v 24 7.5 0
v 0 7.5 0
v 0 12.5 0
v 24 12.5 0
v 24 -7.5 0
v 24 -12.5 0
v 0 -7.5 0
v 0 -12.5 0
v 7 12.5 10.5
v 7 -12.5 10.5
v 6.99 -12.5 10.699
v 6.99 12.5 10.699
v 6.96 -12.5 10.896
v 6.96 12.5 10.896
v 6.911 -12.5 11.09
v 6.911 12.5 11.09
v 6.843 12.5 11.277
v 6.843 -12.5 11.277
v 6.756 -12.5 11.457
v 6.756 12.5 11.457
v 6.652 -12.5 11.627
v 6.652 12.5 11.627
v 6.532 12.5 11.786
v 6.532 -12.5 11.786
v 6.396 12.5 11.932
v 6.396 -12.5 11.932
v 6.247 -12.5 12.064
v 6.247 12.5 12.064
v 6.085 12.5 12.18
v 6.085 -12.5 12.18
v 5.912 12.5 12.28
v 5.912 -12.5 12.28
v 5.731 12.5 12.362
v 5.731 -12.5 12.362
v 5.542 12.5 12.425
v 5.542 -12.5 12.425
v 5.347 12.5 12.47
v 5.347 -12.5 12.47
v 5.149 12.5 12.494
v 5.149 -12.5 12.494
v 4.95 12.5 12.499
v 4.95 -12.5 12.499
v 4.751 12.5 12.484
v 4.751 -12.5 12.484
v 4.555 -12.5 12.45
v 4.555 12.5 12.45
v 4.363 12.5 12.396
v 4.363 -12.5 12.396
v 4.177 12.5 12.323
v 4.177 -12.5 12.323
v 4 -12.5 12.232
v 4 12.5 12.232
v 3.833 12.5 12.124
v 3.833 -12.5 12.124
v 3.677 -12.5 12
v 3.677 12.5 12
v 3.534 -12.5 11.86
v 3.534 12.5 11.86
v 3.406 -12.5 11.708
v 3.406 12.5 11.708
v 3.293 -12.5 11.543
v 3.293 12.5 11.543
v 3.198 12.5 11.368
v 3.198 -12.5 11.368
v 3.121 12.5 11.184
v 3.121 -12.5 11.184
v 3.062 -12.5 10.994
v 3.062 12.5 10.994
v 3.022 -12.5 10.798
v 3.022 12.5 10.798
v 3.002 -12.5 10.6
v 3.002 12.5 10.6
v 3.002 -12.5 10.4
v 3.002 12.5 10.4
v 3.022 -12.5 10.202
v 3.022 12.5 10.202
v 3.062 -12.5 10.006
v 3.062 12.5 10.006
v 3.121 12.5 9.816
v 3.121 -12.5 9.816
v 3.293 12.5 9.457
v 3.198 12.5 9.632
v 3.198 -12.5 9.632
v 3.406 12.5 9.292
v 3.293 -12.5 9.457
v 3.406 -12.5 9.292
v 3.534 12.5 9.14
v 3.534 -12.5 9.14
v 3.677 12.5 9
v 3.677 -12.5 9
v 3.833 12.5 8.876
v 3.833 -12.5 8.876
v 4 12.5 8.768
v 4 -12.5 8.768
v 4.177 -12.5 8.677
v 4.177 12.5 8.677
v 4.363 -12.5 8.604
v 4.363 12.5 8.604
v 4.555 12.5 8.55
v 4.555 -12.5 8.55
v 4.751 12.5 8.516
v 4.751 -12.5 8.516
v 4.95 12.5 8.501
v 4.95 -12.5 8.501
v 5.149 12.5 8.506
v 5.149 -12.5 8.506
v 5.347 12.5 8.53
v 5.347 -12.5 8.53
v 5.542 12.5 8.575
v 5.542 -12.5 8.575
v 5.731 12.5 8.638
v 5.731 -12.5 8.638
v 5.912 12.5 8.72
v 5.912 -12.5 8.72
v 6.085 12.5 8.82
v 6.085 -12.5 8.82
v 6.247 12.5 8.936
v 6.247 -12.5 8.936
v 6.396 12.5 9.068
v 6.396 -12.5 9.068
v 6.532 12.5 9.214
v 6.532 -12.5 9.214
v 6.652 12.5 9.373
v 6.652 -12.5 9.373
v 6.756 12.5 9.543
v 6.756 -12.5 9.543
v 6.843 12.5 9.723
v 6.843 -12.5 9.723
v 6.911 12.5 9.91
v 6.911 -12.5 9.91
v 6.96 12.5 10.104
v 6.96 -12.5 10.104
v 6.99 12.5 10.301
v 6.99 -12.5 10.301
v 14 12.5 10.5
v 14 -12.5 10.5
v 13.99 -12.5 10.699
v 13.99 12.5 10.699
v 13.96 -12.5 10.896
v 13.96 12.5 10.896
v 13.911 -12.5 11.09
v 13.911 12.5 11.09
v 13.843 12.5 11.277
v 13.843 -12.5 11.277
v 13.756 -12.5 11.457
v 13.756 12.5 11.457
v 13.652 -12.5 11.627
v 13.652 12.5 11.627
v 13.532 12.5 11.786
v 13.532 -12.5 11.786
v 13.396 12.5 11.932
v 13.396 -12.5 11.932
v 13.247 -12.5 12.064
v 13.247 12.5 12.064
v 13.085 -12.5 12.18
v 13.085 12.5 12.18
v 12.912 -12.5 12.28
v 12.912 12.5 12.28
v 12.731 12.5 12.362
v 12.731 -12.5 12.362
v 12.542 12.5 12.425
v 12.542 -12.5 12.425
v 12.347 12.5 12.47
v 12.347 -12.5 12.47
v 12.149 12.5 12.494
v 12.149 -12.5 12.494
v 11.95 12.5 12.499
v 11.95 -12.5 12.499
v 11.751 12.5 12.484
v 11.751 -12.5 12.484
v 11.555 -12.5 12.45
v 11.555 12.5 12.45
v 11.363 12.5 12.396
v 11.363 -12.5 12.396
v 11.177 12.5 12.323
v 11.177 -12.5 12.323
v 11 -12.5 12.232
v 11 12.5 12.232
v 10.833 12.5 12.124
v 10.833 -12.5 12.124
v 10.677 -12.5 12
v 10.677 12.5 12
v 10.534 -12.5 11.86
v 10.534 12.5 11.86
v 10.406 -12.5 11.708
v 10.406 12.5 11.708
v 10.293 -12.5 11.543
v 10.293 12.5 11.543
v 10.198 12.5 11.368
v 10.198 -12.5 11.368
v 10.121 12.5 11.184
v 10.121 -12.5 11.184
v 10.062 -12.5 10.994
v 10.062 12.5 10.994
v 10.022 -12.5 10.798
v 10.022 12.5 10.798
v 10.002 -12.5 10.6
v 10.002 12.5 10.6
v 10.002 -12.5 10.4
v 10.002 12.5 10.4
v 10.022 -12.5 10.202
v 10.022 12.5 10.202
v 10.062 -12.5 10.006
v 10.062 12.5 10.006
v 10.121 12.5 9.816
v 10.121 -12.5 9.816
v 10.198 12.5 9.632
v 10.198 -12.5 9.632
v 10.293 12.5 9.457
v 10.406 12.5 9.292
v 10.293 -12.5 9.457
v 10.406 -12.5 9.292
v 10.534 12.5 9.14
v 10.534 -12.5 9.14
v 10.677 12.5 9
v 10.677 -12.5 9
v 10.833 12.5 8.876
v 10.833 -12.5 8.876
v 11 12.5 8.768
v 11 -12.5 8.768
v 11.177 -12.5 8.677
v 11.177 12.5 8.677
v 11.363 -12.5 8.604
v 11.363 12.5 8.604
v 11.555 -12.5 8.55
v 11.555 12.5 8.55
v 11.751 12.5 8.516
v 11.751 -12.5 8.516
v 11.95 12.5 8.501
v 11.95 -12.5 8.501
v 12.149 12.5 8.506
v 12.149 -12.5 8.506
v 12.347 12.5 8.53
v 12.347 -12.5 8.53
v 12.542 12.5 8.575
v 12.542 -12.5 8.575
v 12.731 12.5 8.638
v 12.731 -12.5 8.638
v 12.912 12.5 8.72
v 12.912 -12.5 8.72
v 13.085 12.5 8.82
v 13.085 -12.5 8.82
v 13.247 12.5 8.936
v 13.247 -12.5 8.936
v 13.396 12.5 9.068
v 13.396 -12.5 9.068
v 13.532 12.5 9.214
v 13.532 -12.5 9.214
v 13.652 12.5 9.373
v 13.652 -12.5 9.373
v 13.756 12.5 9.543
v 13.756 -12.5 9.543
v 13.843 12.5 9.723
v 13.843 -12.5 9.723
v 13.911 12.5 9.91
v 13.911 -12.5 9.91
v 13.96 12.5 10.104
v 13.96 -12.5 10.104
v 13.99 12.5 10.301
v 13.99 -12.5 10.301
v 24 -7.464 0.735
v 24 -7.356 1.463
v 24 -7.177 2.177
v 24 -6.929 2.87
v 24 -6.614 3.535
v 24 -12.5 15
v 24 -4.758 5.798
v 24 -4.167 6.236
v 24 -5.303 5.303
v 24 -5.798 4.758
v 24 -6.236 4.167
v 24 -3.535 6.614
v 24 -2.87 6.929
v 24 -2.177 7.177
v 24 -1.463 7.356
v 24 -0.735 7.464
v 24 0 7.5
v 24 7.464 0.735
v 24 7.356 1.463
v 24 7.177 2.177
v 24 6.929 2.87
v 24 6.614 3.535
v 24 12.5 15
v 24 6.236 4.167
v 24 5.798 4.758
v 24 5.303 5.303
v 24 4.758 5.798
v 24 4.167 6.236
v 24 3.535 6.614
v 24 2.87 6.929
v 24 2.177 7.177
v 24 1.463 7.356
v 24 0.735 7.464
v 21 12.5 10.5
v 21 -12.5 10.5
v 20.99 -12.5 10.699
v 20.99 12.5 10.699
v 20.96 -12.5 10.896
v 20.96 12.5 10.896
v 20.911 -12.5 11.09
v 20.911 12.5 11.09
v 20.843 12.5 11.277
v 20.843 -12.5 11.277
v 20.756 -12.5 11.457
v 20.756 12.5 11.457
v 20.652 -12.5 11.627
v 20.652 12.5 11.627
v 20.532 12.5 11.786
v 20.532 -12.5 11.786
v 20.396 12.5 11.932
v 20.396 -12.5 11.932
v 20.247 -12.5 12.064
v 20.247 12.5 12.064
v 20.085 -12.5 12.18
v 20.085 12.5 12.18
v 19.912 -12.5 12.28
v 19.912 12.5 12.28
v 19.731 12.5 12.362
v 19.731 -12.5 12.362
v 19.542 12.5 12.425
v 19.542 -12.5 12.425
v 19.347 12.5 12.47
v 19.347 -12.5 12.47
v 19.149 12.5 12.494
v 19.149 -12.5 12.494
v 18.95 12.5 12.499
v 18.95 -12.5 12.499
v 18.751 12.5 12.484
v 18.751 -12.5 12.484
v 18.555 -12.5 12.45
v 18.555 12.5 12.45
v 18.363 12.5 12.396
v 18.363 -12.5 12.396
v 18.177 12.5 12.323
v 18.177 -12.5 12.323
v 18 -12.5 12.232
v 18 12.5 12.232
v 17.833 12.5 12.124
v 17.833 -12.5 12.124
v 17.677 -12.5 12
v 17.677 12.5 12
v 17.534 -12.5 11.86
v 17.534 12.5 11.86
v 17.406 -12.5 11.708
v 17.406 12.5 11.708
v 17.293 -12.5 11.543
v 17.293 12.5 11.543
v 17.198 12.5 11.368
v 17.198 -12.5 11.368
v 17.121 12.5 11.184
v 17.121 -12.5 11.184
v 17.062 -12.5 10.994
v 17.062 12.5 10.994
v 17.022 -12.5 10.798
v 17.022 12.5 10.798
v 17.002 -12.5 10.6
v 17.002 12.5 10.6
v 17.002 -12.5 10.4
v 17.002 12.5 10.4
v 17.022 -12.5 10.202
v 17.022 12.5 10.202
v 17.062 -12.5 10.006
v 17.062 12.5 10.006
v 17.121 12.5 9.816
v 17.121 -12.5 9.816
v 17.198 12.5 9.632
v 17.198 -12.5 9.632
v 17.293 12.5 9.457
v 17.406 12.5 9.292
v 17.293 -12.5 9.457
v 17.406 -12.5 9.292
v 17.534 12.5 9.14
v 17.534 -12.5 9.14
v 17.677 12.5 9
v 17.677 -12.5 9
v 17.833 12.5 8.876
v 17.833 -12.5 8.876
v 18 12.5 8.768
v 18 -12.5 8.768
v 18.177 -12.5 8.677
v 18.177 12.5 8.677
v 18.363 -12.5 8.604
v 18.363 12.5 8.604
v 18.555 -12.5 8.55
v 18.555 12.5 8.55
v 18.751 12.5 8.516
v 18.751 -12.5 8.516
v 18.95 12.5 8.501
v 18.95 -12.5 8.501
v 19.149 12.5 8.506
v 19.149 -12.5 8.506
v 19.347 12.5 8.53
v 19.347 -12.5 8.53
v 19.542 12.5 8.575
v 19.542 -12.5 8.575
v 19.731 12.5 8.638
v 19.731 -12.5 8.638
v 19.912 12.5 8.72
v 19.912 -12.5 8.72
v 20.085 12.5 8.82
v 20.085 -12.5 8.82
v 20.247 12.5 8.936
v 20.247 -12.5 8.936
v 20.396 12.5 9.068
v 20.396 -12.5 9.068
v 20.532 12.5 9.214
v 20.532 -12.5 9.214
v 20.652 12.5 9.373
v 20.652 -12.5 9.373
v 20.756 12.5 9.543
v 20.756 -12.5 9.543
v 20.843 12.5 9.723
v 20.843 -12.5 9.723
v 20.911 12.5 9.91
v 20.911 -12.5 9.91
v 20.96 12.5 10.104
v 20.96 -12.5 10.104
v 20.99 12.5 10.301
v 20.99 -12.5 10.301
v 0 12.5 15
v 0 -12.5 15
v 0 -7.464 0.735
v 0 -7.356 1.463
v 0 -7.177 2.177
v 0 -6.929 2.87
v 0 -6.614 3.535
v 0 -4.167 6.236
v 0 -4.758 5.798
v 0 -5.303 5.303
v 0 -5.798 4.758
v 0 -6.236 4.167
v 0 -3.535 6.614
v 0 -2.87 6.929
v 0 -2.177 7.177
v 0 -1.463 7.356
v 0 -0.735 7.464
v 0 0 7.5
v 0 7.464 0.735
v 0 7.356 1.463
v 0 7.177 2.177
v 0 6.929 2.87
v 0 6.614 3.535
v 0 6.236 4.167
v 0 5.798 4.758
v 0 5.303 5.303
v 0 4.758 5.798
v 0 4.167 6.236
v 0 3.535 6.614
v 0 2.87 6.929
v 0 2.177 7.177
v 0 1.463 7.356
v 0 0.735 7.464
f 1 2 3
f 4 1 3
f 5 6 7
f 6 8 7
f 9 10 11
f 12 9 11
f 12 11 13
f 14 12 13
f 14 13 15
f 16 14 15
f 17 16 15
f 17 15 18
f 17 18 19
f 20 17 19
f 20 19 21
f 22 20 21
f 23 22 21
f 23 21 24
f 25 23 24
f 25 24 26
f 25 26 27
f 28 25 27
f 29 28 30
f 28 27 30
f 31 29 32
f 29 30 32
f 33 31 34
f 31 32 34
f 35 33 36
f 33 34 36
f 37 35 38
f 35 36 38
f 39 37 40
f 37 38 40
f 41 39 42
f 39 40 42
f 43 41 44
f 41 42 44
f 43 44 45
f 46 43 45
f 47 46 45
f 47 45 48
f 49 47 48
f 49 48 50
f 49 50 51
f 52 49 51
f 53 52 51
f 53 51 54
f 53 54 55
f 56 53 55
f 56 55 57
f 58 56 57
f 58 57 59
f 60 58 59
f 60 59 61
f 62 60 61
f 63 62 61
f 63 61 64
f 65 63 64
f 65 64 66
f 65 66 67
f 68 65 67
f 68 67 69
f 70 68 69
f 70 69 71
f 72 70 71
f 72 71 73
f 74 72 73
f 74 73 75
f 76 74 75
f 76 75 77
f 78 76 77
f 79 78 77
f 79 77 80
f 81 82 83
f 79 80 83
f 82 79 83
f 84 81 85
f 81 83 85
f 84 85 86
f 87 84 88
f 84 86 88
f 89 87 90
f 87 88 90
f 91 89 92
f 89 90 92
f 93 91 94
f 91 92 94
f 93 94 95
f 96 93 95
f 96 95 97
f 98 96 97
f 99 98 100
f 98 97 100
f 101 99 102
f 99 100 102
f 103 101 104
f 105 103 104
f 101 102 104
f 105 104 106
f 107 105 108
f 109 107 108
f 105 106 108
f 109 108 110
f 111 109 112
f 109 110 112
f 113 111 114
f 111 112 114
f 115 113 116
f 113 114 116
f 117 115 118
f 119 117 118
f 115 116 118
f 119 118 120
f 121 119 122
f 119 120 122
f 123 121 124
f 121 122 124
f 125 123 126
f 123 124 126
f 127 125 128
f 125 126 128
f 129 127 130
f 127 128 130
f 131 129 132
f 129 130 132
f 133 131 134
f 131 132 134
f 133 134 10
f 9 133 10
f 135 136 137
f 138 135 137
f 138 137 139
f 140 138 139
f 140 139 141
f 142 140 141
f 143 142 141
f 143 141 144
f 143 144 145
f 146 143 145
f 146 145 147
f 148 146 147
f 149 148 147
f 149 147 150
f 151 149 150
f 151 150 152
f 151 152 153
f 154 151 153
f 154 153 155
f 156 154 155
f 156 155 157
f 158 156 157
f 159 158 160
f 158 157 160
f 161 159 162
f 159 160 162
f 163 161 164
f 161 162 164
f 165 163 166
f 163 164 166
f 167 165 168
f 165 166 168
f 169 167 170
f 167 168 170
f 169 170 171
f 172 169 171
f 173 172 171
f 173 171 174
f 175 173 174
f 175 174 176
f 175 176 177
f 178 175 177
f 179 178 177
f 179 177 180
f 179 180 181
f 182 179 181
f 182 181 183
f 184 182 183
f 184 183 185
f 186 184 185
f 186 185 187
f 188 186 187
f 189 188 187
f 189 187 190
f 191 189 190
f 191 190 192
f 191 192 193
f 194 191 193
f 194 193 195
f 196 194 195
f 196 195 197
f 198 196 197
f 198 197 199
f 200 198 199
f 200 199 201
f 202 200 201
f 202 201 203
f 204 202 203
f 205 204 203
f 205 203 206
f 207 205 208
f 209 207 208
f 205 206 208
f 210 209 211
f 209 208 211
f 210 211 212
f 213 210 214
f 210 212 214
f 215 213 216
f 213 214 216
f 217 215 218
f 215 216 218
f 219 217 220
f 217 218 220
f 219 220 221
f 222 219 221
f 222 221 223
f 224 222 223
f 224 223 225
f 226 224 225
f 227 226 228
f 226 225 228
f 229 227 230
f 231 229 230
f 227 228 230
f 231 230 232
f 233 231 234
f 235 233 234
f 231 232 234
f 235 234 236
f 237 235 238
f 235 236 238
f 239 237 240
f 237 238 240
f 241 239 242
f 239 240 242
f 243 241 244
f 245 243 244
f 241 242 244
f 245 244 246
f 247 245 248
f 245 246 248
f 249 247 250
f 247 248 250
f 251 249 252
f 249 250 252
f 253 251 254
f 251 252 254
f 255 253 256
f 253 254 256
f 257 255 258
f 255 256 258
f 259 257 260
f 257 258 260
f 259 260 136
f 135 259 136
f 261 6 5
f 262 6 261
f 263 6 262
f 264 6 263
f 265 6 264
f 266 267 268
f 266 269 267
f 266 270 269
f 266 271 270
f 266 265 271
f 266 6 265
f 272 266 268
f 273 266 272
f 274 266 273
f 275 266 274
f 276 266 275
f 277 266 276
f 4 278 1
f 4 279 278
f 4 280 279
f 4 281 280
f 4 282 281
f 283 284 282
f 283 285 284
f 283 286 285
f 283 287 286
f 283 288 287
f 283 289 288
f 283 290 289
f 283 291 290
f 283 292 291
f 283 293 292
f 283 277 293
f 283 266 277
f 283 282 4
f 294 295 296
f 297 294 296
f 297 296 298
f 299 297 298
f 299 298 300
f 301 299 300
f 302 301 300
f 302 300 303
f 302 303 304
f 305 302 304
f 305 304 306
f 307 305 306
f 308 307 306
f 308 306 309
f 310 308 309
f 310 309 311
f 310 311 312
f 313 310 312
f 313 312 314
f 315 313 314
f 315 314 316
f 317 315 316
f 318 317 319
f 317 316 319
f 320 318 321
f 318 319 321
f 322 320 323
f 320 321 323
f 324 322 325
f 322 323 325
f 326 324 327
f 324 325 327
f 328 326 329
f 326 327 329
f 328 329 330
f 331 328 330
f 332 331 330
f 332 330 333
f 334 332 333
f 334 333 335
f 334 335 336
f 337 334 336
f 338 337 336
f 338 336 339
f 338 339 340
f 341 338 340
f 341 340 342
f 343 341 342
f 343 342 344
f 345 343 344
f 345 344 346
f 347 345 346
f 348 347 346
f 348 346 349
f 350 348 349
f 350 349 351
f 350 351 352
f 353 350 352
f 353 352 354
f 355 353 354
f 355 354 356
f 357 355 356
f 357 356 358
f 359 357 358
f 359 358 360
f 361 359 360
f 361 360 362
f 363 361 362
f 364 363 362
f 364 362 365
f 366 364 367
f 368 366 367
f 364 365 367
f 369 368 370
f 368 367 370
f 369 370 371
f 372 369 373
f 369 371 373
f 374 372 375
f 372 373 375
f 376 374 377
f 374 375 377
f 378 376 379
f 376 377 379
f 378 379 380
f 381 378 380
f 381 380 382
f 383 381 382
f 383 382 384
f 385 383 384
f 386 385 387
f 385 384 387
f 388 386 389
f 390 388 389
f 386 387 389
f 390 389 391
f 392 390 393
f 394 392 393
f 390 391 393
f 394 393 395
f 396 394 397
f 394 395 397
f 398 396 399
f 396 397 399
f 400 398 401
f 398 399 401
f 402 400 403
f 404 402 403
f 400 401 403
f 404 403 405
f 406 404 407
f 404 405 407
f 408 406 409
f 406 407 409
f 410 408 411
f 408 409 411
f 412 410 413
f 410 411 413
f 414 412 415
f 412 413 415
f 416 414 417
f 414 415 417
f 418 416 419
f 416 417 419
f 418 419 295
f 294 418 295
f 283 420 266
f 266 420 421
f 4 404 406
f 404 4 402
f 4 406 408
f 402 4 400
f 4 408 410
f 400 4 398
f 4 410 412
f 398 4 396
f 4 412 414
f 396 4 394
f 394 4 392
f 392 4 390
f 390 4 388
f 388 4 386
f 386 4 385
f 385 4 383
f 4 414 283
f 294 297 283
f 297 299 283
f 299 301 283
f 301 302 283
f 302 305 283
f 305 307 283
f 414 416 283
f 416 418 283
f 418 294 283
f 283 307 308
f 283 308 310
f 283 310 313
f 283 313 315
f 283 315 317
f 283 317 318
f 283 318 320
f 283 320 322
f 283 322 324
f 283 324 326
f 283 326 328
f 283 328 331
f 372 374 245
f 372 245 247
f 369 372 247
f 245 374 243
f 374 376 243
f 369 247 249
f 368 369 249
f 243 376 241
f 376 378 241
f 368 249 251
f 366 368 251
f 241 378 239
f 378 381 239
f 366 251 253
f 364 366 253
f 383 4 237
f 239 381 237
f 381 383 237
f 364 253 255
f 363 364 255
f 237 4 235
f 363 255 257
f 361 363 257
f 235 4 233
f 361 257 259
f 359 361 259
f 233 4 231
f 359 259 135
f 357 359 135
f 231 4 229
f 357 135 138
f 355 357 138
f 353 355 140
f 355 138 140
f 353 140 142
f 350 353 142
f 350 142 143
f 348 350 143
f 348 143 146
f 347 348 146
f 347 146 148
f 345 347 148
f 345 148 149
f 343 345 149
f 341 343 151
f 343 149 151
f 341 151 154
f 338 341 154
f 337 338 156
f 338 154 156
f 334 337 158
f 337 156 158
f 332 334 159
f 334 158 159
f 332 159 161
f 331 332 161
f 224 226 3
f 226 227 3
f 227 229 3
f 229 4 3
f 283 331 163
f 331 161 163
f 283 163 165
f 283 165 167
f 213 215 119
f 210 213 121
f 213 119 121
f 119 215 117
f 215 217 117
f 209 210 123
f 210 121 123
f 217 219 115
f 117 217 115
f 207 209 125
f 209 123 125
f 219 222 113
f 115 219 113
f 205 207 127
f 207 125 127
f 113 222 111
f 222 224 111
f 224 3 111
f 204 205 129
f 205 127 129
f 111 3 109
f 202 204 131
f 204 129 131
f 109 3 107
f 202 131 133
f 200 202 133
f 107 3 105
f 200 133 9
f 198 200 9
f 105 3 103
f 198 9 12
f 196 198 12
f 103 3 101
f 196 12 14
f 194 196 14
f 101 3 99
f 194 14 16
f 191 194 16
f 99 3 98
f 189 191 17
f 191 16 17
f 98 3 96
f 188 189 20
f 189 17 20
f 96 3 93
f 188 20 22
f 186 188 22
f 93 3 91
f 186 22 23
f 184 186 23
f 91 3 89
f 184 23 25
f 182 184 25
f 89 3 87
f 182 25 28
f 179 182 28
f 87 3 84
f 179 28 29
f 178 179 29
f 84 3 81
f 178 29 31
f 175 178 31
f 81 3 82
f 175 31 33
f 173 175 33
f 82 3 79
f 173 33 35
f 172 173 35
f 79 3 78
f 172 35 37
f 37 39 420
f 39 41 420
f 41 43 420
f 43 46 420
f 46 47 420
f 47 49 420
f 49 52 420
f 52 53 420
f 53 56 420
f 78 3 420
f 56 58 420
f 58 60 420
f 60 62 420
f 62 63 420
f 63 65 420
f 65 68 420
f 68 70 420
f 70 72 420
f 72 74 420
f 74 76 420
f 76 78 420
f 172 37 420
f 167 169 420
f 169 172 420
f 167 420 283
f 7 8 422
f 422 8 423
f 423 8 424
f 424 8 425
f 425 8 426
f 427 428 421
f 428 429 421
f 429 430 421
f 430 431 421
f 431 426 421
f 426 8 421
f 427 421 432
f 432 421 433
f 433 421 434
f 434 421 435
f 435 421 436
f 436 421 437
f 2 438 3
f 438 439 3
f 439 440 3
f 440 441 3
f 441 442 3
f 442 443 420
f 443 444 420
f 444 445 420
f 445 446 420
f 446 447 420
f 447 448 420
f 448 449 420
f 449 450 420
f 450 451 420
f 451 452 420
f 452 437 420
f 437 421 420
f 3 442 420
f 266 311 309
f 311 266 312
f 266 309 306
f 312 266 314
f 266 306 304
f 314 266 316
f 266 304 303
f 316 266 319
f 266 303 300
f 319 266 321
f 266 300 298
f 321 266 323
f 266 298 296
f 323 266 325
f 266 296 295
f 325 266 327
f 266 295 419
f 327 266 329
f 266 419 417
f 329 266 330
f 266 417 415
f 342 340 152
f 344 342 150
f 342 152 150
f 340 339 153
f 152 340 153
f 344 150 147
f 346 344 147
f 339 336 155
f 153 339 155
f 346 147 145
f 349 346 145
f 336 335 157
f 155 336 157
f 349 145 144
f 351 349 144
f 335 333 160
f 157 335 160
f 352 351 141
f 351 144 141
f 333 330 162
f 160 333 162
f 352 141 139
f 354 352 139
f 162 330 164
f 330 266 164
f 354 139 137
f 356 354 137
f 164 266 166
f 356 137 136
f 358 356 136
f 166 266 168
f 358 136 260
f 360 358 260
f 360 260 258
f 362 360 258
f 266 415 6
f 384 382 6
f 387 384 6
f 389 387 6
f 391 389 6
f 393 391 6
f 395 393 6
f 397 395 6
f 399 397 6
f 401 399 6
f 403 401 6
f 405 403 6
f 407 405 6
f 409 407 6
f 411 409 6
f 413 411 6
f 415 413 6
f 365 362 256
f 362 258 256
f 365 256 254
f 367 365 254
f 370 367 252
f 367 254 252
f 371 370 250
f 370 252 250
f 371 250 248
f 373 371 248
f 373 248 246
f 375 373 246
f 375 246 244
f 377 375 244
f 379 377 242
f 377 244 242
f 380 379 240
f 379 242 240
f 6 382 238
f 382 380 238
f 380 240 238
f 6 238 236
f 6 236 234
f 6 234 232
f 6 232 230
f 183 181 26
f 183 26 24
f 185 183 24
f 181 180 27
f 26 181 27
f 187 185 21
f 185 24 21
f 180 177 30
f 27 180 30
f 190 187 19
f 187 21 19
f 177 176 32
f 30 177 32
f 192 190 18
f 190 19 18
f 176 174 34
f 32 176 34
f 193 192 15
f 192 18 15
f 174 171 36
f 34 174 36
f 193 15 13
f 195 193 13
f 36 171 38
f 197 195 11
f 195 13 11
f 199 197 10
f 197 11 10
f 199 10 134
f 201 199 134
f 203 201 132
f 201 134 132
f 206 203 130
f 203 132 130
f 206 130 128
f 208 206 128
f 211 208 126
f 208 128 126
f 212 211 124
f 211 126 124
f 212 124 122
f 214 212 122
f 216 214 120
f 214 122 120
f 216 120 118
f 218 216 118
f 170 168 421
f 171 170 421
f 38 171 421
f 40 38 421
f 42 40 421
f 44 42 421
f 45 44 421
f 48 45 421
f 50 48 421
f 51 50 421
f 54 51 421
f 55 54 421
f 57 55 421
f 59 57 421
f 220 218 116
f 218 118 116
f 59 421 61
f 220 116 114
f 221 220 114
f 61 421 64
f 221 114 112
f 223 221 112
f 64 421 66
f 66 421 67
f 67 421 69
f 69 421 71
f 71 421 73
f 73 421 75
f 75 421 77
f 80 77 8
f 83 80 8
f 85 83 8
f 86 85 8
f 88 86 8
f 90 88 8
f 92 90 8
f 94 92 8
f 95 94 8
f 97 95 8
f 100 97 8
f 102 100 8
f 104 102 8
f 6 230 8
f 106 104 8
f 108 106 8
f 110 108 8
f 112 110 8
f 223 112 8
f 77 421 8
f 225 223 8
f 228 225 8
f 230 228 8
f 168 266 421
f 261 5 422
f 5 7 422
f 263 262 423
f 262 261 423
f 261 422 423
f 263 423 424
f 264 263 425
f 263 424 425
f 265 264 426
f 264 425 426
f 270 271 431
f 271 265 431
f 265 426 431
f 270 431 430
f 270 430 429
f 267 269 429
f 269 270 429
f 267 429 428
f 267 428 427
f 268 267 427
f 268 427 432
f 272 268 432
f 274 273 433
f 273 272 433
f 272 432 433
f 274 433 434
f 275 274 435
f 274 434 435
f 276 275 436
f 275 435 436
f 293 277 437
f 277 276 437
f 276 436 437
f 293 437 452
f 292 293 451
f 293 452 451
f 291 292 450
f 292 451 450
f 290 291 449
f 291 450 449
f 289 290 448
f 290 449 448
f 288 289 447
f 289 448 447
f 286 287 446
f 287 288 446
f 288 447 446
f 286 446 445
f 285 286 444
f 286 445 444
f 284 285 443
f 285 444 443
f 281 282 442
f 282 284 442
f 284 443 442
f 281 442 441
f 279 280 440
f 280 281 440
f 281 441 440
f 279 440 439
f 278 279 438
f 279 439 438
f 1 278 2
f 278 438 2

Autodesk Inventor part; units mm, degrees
ref_plane "YZ Plane" through (0, 0, 0) normal (1, 0, 0) x (0, 1, 0)
ref_plane "XZ Plane" through (0, 0, 0) normal (0, 1, 0) x (-1, 0, 0)
ref_plane "XY Plane" through (0, 0, 0) normal (0, 0, 1) x (1, 0, 0)
sketch "Sketch1" plane through (0, 0, 0) normal (1, 0, 0) x (0, 1, 0)
  arc A0 (7.5, 0) -> (-7.5, 0) centre (0, 0) ccw
  line L0 (7.5, 0) -> (12.5, 0)
  line L1 (12.5, 0) -> (12.5, 15)
  line L2 (12.5, 15) -> (-12.5, 15)
  line L3 (-12.5, 15) -> (-12.5, 0)
  line L4 (-12.5, 0) -> (-7.5, 0)
  dimension "d0" = 15
  dimension "d1" = 12.5
  dimension "d2" = 15
  dimension "d3" = 25
extrude "Extrusion1" add sketch "Sketch1" along normal blind 24
sketch "Sketch2" plane through (0, -12.5, 0) normal (0, -1, 0) x (1, 0, 0)
  circle A0 centre (5, 10.5) radius 2
  circle A1 centre (12, 10.5) radius 2
  circle A2 centre (19, 10.5) radius 2
  dimension "d11" = 4
extrude "Extrusion2" cut sketch "Sketch2" against normal blind 25
properties part number "Y_RodClam_Bed" material "Birch"
